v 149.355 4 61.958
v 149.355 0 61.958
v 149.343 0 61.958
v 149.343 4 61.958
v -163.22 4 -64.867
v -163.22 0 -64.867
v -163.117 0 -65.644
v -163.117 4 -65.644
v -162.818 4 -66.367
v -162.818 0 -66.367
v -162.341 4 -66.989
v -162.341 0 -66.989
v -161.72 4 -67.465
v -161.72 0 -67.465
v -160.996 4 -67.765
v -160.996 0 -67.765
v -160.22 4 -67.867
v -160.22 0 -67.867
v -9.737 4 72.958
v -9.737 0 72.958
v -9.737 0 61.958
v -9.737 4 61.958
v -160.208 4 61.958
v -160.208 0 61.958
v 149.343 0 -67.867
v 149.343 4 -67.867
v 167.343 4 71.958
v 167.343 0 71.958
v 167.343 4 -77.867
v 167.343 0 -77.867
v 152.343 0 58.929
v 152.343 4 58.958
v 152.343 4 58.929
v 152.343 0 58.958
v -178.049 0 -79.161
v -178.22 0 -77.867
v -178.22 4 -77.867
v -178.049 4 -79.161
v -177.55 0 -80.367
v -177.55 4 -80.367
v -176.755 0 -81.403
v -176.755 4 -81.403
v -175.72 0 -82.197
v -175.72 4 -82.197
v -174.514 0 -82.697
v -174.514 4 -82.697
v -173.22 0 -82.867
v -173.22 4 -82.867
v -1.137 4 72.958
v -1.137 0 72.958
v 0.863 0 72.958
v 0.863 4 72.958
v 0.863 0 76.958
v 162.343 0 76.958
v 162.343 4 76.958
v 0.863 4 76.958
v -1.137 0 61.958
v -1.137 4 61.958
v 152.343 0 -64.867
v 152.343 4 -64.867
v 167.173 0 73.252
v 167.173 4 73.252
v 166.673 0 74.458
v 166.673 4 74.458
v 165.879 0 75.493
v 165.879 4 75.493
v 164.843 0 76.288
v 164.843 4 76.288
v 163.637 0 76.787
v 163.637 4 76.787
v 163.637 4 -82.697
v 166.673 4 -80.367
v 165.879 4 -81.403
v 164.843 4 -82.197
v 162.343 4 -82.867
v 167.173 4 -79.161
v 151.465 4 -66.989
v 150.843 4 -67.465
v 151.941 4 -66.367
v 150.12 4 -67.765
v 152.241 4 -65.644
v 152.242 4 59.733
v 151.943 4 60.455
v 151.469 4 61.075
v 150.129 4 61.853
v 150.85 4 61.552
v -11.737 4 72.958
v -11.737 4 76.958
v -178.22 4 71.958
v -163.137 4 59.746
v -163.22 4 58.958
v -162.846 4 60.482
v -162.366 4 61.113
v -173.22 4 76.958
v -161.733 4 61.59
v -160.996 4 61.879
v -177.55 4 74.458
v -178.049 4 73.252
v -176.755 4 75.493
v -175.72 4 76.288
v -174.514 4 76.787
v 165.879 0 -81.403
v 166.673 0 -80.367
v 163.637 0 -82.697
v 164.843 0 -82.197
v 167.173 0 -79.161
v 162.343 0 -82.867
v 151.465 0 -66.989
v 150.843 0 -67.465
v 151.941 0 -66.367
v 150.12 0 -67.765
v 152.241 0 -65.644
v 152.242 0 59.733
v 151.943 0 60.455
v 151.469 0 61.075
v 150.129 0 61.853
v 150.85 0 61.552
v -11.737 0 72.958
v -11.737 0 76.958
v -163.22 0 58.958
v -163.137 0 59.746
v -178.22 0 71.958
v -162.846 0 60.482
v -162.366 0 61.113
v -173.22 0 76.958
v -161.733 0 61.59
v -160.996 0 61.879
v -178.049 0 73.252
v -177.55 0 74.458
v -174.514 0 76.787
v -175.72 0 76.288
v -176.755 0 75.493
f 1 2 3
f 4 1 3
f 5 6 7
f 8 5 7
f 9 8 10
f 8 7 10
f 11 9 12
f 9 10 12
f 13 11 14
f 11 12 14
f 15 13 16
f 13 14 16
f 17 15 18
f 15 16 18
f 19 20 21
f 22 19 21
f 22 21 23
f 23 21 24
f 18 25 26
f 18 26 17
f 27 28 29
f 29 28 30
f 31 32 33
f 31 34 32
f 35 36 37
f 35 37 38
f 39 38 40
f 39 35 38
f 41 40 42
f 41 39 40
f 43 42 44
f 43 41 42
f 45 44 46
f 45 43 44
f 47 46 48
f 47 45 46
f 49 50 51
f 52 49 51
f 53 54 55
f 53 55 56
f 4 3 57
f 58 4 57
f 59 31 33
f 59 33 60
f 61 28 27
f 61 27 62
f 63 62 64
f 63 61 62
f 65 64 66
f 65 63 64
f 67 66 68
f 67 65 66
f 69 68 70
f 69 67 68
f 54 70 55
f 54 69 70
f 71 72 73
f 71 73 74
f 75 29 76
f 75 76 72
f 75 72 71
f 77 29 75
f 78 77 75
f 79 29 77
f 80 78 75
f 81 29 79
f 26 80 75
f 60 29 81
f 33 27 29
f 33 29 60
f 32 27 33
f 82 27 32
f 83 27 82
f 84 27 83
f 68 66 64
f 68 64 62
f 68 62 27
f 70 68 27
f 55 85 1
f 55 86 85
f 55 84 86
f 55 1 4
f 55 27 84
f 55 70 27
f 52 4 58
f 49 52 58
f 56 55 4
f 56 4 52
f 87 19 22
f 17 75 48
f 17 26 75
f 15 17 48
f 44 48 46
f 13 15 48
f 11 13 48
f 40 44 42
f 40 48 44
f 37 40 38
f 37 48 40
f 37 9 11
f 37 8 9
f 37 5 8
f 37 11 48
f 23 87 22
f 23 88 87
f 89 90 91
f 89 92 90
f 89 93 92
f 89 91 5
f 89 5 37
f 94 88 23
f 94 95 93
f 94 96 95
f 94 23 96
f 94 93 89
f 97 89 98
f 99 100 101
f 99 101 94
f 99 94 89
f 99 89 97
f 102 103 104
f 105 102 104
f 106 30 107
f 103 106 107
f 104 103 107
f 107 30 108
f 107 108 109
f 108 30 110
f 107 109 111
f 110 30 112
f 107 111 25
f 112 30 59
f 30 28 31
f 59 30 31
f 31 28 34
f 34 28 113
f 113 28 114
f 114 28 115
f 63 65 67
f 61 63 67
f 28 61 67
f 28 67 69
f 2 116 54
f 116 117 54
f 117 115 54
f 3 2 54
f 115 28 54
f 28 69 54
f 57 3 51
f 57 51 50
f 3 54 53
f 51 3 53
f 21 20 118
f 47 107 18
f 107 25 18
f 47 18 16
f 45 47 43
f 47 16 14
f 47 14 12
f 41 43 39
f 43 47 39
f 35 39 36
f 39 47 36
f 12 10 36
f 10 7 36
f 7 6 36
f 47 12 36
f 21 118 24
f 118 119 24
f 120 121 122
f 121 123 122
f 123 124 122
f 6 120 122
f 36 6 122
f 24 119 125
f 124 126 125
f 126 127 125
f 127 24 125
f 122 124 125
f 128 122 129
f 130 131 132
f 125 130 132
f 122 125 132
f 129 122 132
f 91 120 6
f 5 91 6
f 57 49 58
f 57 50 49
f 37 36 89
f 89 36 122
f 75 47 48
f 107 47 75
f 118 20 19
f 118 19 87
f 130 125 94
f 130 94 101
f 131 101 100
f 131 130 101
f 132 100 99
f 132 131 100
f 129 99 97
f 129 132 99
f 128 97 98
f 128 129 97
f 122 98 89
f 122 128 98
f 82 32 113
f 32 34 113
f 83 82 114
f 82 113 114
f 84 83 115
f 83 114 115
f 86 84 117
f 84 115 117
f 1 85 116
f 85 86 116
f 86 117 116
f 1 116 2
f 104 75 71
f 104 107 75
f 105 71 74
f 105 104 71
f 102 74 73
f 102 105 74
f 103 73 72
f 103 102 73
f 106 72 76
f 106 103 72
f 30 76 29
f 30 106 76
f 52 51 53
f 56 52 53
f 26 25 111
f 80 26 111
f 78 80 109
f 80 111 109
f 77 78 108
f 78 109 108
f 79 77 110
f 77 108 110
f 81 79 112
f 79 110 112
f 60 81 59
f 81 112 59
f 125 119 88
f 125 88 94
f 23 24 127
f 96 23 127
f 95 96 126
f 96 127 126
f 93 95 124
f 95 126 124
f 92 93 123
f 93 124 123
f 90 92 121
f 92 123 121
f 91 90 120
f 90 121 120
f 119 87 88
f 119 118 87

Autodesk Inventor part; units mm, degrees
ref_plane "YZ Plane" through (0, 0, 0) normal (1, 0, 0) x (0, 1, 0)
ref_plane "XZ Plane" through (0, 0, 0) normal (0, 1, 0) x (-1, 0, 0)
ref_plane "XY Plane" through (0, 0, 0) normal (0, 0, 1) x (1, 0, 0)
sketch "Sketch1" plane through (0, 0, 0) normal (0, 1, 0) x (-1, 0, 0)
  line L0 (-167.3432, 71.9578) -> (-167.3432, -77.8672)
  line L1 (-162.3432, 76.9578) -> (-0.8632, 76.9578)
  line L2 (11.7368, 76.9578) -> (173.2198, 76.9578)
  arc A0 (-162.3432, 76.9578) -> (-167.3432, 71.9578) centre (-162.3432, 71.9578) ccw
  arc A1 (-167.3432, -77.8672) -> (-162.3432, -82.8672) centre (-162.3432, -77.8672) ccw
  line L3 (178.2198, -77.8672) -> (178.2198, 71.9578)
  line L4 (173.2198, -82.8672) -> (-162.3432, -82.8672)
  arc A2 (173.2198, -82.8672) -> (178.2198, -77.8672) centre (173.2198, -77.8672) ccw
  arc A3 (178.2198, 71.9578) -> (173.2198, 76.9578) centre (173.2198, 71.9578) ccw
  line L5 (-149.3552, 61.9583) -> (1.1368, 61.9583)
  line L6 (9.7368, 61.9583) -> (160.2077, 61.9583)
  line L7 (-152.3432, 58.9581) -> (-152.3432, -64.8672)
  line L8 (163.2197, 58.9581) -> (163.2197, -64.8672)
  line L9 (-149.3432, -67.8672) -> (160.2197, -67.8672)
  arc A4 (-149.3432, 61.9583) -> (-152.3432, 58.9289) centre (-149.3432, 58.9581) ccw
  arc A5 (163.2197, 58.9581) -> (160.2077, 61.9583) centre (160.3139, 59.0529) ccw
  arc A6 (160.2197, -67.8672) -> (163.2197, -64.8672) centre (160.2197, -64.8672) ccw
  arc A7 (-152.3432, -64.8672) -> (-149.3432, -67.8672) centre (-149.3432, -64.8672) ccw
  line L10 (1.1368, 72.9578) -> (1.1368, 61.9583)
  line L11 (9.7368, 72.9578) -> (9.7368, 61.9583)
  line L12 (1.1368, 72.9578) -> (-0.8632, 72.9578)
  line L13 (9.7368, 72.9578) -> (11.7368, 72.9578)
  line L14 (11.7368, 72.9578) -> (11.7368, 76.9578)
  line L15 (-0.8632, 72.9578) -> (-0.8632, 76.9578)
  point P0 (0, 0)
extrude "Extrusion1" add sketch "Sketch1" along normal blind 4
properties part number "layer4"
